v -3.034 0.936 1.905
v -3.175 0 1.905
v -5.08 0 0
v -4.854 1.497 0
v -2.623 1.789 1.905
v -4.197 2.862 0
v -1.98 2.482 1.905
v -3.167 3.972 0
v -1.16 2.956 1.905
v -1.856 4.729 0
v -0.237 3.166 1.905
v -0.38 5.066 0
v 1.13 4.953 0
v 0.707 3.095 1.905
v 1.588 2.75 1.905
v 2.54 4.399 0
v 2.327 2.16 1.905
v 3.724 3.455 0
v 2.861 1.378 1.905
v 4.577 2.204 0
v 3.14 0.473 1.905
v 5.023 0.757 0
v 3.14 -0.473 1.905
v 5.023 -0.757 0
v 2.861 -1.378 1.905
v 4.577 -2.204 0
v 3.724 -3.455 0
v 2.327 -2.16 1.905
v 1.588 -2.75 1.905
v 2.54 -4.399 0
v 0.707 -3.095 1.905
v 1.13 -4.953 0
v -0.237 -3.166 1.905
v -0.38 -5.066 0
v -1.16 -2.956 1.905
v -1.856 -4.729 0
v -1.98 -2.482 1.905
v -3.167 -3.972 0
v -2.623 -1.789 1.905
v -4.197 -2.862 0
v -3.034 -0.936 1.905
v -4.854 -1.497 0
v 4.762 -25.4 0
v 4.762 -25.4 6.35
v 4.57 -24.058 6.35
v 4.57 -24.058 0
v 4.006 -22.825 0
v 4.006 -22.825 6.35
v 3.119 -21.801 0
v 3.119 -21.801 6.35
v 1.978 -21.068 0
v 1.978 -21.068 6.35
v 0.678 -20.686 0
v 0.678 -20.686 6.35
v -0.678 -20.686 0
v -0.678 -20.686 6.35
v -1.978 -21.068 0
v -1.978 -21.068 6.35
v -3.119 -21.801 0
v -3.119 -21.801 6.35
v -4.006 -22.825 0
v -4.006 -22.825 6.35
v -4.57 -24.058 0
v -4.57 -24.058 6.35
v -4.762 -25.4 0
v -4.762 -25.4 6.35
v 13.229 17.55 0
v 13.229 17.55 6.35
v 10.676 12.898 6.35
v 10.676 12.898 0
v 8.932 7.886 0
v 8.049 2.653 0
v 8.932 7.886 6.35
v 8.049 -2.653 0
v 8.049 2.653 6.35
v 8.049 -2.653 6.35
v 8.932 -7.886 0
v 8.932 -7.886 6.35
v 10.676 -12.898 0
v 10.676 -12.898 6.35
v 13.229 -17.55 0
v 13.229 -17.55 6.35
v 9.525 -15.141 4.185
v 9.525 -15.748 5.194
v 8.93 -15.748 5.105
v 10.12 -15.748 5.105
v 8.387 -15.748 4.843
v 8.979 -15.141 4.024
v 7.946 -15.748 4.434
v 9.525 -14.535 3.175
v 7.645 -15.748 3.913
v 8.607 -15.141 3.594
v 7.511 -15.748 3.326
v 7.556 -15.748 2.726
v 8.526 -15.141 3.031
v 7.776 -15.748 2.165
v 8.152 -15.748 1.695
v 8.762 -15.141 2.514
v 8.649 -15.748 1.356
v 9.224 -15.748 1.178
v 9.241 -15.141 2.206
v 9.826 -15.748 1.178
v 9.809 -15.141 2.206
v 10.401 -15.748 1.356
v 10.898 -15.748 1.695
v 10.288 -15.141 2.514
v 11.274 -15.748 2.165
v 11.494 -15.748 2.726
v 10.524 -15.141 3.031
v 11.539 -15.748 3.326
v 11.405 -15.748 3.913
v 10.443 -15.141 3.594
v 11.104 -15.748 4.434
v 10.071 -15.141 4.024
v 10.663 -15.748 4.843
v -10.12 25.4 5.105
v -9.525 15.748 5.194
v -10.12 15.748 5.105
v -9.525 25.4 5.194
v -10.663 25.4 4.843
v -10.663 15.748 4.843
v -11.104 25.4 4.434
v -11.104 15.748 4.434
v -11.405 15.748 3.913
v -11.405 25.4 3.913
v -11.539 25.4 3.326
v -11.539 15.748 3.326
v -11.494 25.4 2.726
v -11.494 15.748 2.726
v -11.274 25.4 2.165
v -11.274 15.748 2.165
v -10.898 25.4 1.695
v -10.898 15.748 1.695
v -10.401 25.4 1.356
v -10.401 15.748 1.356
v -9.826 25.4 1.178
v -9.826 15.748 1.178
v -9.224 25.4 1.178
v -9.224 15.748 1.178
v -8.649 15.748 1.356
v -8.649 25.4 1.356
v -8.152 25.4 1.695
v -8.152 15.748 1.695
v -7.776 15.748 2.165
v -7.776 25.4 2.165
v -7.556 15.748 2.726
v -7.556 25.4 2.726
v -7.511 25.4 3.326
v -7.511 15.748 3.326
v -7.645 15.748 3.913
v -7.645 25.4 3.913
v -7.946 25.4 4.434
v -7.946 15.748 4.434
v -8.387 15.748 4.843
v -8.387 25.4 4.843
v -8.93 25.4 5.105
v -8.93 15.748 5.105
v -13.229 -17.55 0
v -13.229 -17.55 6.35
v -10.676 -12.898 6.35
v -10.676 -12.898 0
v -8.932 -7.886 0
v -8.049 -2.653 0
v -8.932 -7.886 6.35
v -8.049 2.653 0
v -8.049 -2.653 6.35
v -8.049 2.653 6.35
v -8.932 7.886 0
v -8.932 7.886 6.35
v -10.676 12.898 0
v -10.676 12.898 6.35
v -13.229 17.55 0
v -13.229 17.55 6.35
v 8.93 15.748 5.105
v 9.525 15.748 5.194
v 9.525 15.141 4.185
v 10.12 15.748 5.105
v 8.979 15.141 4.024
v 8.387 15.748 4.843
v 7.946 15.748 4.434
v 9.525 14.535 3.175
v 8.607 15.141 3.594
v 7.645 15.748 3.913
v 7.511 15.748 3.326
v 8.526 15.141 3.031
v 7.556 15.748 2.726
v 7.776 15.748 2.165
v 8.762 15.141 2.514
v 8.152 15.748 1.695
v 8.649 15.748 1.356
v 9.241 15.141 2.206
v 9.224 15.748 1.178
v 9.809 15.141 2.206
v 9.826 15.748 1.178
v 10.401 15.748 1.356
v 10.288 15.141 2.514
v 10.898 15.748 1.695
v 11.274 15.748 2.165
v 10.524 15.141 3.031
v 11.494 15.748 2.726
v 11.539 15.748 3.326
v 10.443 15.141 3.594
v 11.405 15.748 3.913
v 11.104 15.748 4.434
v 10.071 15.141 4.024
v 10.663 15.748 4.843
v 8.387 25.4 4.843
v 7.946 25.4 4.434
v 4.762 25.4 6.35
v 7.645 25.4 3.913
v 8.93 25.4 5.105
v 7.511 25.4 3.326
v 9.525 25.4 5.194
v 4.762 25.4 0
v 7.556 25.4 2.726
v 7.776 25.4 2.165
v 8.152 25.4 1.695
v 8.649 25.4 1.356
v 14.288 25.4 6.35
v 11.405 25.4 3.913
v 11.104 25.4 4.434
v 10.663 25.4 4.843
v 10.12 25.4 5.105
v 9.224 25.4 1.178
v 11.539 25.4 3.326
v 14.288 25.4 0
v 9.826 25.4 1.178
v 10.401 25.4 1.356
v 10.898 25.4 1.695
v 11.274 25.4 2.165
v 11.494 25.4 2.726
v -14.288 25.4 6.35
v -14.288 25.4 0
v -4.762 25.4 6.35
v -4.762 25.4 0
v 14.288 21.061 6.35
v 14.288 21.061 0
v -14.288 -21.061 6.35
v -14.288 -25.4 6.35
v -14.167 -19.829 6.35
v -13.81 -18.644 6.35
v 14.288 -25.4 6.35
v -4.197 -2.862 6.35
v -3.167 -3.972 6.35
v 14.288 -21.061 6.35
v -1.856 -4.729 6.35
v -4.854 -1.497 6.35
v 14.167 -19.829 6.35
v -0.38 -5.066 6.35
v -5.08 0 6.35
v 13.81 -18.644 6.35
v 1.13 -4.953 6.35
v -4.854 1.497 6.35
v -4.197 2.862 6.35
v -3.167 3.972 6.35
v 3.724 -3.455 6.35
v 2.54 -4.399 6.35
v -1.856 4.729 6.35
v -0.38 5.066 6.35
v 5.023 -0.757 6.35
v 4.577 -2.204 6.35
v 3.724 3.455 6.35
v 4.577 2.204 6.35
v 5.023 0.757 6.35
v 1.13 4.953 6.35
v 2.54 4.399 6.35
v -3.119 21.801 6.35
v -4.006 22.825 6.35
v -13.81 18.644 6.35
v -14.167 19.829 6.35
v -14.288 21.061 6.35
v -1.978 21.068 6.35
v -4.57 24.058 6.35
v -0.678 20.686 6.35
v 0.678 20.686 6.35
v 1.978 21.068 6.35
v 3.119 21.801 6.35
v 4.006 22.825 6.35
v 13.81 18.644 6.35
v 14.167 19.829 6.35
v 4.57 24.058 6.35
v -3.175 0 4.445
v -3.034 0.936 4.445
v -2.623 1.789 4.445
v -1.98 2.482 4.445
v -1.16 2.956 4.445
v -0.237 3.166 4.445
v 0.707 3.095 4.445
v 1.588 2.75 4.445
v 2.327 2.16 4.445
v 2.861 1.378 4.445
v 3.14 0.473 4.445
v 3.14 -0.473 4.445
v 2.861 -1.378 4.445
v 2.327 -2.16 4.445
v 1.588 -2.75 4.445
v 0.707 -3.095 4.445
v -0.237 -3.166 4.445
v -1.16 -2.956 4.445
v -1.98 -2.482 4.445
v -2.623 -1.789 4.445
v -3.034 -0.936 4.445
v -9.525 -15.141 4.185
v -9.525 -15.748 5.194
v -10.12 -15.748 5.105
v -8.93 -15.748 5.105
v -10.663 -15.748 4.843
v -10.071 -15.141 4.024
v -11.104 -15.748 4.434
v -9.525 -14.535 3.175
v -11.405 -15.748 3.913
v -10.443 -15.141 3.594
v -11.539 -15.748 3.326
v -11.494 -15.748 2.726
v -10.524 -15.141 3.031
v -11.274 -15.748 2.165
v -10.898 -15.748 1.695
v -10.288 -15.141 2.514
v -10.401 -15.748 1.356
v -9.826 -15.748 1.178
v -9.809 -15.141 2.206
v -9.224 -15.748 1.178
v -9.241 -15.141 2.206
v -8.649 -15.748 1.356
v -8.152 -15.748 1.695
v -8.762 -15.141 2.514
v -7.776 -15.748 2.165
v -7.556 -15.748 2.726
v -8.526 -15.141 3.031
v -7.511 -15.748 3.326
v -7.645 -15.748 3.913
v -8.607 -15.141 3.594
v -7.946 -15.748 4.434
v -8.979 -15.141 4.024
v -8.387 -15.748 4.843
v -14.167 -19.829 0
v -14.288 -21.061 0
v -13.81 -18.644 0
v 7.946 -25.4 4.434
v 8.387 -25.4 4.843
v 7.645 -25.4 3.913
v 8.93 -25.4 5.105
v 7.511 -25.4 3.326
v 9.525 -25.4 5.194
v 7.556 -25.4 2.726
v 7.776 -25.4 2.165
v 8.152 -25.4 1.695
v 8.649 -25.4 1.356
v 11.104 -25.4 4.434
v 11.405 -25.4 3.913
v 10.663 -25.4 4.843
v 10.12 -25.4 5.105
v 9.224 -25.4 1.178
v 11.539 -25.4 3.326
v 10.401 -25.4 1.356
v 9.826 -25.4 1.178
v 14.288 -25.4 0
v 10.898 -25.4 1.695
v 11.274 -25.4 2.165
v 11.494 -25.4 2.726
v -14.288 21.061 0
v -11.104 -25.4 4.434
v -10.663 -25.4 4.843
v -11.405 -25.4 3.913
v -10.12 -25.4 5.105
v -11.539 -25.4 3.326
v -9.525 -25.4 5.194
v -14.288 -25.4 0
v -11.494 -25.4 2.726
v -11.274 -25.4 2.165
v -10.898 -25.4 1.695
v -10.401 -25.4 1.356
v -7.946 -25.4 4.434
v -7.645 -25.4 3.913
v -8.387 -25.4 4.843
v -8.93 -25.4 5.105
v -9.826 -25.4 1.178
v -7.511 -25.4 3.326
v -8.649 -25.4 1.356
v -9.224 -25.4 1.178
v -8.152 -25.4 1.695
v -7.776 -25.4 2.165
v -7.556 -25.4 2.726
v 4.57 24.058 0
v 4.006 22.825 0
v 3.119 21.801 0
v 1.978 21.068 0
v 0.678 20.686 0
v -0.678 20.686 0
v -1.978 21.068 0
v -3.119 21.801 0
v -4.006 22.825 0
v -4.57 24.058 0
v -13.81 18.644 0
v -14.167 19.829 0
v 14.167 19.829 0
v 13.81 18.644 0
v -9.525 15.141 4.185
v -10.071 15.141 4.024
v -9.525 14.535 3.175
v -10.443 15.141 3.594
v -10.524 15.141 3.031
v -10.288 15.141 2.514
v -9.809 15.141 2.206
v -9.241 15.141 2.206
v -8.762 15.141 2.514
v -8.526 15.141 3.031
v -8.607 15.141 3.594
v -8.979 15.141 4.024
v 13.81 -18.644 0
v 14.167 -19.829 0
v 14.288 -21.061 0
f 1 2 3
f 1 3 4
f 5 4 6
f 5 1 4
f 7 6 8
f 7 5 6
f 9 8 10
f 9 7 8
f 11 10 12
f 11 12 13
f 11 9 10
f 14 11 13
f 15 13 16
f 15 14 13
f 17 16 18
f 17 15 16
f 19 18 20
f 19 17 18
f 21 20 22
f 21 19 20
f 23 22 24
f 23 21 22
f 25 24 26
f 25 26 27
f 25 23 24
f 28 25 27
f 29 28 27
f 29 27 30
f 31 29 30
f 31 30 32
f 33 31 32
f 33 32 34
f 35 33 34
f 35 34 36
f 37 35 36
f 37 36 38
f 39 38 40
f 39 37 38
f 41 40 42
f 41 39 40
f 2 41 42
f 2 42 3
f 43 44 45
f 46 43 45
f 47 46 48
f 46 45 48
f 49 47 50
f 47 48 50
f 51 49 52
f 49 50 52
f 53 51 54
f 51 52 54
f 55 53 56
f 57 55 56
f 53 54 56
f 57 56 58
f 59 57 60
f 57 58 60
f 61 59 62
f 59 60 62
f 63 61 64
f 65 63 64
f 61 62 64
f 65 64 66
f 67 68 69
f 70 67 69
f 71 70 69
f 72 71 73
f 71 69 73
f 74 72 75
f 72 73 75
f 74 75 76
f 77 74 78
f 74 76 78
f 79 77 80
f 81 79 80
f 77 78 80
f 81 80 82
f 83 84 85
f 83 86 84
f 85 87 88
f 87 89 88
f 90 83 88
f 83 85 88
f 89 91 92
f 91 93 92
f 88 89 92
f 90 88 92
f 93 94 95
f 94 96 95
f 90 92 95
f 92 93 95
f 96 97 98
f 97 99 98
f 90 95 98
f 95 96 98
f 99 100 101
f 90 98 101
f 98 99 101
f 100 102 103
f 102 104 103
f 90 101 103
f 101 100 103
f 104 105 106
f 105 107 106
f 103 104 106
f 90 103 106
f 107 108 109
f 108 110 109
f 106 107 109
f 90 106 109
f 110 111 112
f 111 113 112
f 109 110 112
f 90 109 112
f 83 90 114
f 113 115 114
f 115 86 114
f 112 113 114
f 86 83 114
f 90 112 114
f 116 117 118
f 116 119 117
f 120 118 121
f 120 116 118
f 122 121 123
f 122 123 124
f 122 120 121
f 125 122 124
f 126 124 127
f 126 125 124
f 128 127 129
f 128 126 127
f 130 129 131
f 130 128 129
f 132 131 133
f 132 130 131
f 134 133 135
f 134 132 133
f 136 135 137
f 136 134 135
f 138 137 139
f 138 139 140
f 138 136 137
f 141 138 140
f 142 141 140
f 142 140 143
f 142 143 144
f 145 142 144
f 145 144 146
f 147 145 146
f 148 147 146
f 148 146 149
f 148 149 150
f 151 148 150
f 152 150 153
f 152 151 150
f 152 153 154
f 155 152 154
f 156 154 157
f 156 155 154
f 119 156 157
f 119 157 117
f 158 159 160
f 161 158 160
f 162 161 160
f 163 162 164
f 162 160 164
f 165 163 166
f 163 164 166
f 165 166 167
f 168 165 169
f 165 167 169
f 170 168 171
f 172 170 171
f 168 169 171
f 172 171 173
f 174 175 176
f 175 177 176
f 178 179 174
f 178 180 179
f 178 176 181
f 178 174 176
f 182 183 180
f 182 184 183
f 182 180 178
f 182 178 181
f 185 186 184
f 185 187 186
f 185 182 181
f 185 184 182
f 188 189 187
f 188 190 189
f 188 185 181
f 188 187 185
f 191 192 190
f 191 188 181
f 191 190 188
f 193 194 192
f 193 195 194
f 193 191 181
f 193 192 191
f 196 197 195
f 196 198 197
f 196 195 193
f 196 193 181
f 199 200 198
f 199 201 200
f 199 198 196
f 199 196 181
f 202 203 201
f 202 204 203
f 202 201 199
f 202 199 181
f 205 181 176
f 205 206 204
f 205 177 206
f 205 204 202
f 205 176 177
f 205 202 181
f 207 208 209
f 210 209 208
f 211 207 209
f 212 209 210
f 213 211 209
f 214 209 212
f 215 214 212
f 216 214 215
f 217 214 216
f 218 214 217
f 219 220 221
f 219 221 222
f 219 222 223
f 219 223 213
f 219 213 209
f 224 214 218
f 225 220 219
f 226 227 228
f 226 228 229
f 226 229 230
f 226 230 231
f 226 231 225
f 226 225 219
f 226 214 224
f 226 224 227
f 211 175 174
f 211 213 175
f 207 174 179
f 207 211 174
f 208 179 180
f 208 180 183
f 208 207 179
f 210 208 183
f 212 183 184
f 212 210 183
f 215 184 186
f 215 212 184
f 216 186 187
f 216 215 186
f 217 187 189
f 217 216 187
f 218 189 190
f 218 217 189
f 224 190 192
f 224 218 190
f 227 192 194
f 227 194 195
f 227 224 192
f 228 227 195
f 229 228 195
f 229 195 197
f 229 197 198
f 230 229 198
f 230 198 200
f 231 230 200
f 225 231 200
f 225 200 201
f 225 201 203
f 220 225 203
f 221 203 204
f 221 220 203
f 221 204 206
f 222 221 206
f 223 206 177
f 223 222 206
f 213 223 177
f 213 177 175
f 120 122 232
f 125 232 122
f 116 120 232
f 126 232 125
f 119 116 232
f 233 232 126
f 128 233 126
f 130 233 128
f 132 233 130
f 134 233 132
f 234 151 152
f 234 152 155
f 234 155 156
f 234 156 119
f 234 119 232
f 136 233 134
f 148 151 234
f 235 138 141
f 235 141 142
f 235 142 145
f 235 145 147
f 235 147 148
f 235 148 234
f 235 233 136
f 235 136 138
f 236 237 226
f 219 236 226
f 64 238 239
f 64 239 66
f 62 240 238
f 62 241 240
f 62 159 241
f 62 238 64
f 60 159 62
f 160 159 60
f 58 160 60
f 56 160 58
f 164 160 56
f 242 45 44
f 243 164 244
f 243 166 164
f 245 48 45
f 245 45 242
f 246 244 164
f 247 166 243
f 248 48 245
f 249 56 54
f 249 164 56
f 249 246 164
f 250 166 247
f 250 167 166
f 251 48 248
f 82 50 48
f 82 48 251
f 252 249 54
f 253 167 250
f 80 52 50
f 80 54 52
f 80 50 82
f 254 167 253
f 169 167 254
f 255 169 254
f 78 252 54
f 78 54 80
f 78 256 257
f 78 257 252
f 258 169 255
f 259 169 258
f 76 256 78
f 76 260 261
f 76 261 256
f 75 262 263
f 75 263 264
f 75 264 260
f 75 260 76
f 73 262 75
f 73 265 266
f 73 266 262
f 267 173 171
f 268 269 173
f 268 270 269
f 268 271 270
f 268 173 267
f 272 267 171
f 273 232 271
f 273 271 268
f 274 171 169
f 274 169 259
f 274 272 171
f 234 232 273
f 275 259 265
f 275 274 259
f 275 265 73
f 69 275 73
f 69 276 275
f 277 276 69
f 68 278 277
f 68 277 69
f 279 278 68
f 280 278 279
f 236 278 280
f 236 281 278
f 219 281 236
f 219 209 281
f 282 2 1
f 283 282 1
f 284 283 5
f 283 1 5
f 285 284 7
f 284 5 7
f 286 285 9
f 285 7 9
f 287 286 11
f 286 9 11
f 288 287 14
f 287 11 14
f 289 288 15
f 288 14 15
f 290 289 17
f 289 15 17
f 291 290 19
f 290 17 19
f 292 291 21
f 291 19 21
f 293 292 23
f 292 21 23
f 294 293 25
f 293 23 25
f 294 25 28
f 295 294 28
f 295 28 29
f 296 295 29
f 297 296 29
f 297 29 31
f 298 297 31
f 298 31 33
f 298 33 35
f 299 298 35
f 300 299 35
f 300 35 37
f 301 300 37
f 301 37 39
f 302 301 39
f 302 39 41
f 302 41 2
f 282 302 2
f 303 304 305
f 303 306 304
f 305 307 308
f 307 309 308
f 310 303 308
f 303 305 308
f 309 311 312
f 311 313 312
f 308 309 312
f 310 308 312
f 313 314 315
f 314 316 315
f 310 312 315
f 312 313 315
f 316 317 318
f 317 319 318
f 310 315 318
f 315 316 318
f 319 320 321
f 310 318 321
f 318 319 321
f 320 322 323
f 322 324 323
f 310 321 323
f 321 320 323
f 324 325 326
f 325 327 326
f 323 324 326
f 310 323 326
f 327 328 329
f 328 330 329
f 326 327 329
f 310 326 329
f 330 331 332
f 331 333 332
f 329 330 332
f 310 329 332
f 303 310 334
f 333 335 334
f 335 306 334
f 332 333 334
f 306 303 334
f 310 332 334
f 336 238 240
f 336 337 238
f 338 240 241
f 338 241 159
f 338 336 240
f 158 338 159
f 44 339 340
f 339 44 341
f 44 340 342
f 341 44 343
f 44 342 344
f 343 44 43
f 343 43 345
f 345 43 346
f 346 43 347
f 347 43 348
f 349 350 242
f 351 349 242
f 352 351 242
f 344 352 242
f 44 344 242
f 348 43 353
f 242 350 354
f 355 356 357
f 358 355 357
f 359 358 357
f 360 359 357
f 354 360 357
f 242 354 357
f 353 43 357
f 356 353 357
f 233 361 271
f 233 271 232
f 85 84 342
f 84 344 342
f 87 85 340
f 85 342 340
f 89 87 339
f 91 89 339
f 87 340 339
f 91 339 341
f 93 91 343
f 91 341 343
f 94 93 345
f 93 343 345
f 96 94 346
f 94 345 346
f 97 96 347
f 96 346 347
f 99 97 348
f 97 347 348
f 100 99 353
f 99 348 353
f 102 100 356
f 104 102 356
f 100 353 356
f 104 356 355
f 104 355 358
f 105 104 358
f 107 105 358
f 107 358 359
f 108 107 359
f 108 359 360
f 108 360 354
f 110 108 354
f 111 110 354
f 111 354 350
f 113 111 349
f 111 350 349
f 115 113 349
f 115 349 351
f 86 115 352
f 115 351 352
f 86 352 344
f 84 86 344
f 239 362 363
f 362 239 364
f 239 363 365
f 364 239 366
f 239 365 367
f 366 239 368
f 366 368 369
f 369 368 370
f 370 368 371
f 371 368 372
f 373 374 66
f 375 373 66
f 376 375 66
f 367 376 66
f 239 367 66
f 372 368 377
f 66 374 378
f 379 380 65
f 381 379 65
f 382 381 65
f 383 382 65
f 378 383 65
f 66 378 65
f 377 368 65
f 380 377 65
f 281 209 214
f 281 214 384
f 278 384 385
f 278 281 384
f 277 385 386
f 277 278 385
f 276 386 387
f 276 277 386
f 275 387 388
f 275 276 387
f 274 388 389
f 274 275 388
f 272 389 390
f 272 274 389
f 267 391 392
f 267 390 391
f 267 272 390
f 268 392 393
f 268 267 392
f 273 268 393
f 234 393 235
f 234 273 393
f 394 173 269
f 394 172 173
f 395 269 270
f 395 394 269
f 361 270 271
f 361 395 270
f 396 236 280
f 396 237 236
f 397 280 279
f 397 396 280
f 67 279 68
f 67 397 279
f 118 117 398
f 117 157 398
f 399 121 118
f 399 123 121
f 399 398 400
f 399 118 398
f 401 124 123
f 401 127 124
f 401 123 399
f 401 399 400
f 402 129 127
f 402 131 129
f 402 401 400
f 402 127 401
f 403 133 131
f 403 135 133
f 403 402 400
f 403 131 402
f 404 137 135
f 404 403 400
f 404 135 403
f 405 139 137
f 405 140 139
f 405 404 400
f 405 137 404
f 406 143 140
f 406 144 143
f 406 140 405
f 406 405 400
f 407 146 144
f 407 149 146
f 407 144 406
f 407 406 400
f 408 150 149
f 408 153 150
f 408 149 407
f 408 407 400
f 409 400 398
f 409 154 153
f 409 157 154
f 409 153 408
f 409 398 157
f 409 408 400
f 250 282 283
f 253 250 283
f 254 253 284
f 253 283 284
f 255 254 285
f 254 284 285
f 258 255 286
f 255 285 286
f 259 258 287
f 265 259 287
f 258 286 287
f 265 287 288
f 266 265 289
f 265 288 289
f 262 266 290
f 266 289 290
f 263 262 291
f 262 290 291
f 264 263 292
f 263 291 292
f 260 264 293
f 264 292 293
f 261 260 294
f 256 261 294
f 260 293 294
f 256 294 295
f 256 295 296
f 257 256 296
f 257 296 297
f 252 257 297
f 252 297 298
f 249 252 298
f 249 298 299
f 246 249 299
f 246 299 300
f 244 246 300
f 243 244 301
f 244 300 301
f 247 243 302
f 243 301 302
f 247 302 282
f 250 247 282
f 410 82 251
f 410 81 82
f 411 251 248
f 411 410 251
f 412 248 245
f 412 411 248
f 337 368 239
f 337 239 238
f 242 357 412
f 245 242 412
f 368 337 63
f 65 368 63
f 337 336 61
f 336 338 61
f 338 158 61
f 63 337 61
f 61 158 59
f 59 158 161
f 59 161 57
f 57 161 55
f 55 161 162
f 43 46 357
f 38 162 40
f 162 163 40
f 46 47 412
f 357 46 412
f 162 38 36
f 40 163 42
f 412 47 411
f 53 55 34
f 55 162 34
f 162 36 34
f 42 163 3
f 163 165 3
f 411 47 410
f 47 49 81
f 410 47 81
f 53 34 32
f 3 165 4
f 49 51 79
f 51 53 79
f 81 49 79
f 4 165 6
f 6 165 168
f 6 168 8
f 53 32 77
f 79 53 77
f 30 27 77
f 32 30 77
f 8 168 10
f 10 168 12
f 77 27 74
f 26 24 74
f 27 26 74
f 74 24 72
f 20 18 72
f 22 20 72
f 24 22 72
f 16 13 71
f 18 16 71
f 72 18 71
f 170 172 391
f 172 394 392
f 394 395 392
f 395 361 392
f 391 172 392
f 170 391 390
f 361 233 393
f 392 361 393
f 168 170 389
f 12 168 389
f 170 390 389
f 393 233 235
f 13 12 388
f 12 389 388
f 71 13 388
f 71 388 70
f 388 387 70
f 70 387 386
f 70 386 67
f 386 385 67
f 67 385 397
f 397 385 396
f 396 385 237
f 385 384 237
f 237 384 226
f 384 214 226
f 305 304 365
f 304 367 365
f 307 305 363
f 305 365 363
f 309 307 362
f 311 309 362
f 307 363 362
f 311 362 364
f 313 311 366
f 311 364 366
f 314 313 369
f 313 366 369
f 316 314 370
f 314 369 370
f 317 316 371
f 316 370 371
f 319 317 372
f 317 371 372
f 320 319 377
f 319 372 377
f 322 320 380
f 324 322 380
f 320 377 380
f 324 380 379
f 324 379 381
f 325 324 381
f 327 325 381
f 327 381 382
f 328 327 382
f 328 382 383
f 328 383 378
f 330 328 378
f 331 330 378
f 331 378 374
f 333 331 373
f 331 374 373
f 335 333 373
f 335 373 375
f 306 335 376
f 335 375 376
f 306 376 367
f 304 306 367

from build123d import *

# Parameters (mm, degrees)
SKETCH1_W                       = 28.575
SKETCH1_H                       = 50.8
BOSS_EXTRUDE1_DEPTH             = 6.35
F_10_32_TAPPED_HOLE1_AT_2_COUNT = 2
F_10_32_TAPPED_HOLE1_AT_2_PITCH = 19.05
F_1_4_0_25_DIAMETER_HOLE1_D     = 6.35
F_1_4_0_25_DIAMETER_HOLE1_DEPTH = 10.668
F_1_4_0_25_DIAMETER_HOLE1_TIP   = 1.907732465
CHAMFER1_SIZE                   = 1.905
CUT_EXTRUDE1_DEPTH              = 7.35
FILLET1_R                       = 6.35


with BuildPart() as part:
    # Sketch1 → Boss-Extrude1 (new body)
    with BuildSketch(Plane.XY):
        Rectangle(SKETCH1_W, SKETCH1_H)
    extrude(amount=BOSS_EXTRUDE1_DEPTH)

    # Sketch3 → #10-32 Tapped Hole1 (revolve, cut)
    with BuildSketch(Plane(origin=(-9.525, 25.4, 3.175), x_dir=(0, 0, 1), z_dir=(1, 0, 0))):
        Polygon((0, 0), (0, 10.865317848), (2.0193, 9.652), (2.0193, 0), align=None)
    f_10_32_tapped_hole1 = revolve(axis=Axis((-9.525, 31.75, 3.175), (0, -1, 0)), mode=Mode.SUBTRACT)

    # #10-32 Tapped Hole1 at 2: #10-32 Tapped Hole1 ×2
    with Locations(*[(i * F_10_32_TAPPED_HOLE1_AT_2_PITCH, 0, 0) for i in range(1, F_10_32_TAPPED_HOLE1_AT_2_COUNT)]):
        add(f_10_32_tapped_hole1, mode=Mode.SUBTRACT)

    # Mirror1: #10-32 Tapped Hole1 across plane
    add(f_10_32_tapped_hole1.mirror(Plane.ZX), mode=Mode.SUBTRACT)

    # Mirror1 copy 1 sketch → Mirror1 copy 1 (revolve, cut)
    with BuildSketch(Plane(origin=(9.525, -25.4, 3.175), x_dir=(0, 0, 1), z_dir=(1, 0, 0))):
        Polygon((0, 0), (0, -10.865317848), (2.0193, -9.652), (2.0193, 0), align=None)
    revolve(axis=Axis((9.525, -31.75, 3.175), (0, -1, 0)), mode=Mode.SUBTRACT)

    # 1/4 (0.25) Diameter Hole1
    with Locations(Plane.XY.offset(6.35)):
        with Locations((0, 0)):
            Hole(F_1_4_0_25_DIAMETER_HOLE1_D / 2, depth=F_1_4_0_25_DIAMETER_HOLE1_DEPTH)
            with Locations((0, 0, -(F_1_4_0_25_DIAMETER_HOLE1_DEPTH + F_1_4_0_25_DIAMETER_HOLE1_TIP / 2))):  # 118° drill point
                Cone(0, F_1_4_0_25_DIAMETER_HOLE1_D / 2, F_1_4_0_25_DIAMETER_HOLE1_TIP, mode=Mode.SUBTRACT)

    # Chamfer1
    chamfer1_edges = [part.edges().sort_by_distance(p)[0] for p in [
        (3.175, 0, 0),
        (3.175, 0, 6.35),
    ]]
    chamfer(chamfer1_edges, length=CHAMFER1_SIZE)

    # Sketch6 → Cut-Extrude1 (cut, through all)
    with BuildSketch(Plane.XY.offset(6.35)):
        with BuildLine():
            Line((-14.2875, 19.05), (-14.2875, -19.05))
            ThreePointArc((-14.2875, -19.05), (-7.9375, 0), (-14.2875, 19.05))
        make_face()
        with BuildLine():
            Line((14.2875, -19.05), (14.2875, 19.05))
            ThreePointArc((14.2875, 19.05), (7.9375, 0), (14.2875, -19.05))
        make_face()
        with BuildLine():
            Line((-4.7625, 25.4), (4.7625, 25.4))
            ThreePointArc((4.7625, 25.4), (0, 20.6375), (-4.7625, 25.4))
        make_face()
        with BuildLine():
            Line((-4.7625, -25.4), (4.7625, -25.4))
            ThreePointArc((4.7625, -25.4), (0, -20.6375), (-4.7625, -25.4))
        make_face()
    extrude(amount=-CUT_EXTRUDE1_DEPTH, mode=Mode.SUBTRACT)

    # Fillet1
    fillet1_edges = [part.edges().sort_by_distance(p)[0] for p in [
        (-14.2875, 19.05, 3.175),
        (-14.2875, -19.05, 3.175),
        (14.2875, -19.05, 3.175),
        (14.2875, 19.05, 3.175),
    ]]
    fillet(fillet1_edges, radius=FILLET1_R)


solid = part.part
